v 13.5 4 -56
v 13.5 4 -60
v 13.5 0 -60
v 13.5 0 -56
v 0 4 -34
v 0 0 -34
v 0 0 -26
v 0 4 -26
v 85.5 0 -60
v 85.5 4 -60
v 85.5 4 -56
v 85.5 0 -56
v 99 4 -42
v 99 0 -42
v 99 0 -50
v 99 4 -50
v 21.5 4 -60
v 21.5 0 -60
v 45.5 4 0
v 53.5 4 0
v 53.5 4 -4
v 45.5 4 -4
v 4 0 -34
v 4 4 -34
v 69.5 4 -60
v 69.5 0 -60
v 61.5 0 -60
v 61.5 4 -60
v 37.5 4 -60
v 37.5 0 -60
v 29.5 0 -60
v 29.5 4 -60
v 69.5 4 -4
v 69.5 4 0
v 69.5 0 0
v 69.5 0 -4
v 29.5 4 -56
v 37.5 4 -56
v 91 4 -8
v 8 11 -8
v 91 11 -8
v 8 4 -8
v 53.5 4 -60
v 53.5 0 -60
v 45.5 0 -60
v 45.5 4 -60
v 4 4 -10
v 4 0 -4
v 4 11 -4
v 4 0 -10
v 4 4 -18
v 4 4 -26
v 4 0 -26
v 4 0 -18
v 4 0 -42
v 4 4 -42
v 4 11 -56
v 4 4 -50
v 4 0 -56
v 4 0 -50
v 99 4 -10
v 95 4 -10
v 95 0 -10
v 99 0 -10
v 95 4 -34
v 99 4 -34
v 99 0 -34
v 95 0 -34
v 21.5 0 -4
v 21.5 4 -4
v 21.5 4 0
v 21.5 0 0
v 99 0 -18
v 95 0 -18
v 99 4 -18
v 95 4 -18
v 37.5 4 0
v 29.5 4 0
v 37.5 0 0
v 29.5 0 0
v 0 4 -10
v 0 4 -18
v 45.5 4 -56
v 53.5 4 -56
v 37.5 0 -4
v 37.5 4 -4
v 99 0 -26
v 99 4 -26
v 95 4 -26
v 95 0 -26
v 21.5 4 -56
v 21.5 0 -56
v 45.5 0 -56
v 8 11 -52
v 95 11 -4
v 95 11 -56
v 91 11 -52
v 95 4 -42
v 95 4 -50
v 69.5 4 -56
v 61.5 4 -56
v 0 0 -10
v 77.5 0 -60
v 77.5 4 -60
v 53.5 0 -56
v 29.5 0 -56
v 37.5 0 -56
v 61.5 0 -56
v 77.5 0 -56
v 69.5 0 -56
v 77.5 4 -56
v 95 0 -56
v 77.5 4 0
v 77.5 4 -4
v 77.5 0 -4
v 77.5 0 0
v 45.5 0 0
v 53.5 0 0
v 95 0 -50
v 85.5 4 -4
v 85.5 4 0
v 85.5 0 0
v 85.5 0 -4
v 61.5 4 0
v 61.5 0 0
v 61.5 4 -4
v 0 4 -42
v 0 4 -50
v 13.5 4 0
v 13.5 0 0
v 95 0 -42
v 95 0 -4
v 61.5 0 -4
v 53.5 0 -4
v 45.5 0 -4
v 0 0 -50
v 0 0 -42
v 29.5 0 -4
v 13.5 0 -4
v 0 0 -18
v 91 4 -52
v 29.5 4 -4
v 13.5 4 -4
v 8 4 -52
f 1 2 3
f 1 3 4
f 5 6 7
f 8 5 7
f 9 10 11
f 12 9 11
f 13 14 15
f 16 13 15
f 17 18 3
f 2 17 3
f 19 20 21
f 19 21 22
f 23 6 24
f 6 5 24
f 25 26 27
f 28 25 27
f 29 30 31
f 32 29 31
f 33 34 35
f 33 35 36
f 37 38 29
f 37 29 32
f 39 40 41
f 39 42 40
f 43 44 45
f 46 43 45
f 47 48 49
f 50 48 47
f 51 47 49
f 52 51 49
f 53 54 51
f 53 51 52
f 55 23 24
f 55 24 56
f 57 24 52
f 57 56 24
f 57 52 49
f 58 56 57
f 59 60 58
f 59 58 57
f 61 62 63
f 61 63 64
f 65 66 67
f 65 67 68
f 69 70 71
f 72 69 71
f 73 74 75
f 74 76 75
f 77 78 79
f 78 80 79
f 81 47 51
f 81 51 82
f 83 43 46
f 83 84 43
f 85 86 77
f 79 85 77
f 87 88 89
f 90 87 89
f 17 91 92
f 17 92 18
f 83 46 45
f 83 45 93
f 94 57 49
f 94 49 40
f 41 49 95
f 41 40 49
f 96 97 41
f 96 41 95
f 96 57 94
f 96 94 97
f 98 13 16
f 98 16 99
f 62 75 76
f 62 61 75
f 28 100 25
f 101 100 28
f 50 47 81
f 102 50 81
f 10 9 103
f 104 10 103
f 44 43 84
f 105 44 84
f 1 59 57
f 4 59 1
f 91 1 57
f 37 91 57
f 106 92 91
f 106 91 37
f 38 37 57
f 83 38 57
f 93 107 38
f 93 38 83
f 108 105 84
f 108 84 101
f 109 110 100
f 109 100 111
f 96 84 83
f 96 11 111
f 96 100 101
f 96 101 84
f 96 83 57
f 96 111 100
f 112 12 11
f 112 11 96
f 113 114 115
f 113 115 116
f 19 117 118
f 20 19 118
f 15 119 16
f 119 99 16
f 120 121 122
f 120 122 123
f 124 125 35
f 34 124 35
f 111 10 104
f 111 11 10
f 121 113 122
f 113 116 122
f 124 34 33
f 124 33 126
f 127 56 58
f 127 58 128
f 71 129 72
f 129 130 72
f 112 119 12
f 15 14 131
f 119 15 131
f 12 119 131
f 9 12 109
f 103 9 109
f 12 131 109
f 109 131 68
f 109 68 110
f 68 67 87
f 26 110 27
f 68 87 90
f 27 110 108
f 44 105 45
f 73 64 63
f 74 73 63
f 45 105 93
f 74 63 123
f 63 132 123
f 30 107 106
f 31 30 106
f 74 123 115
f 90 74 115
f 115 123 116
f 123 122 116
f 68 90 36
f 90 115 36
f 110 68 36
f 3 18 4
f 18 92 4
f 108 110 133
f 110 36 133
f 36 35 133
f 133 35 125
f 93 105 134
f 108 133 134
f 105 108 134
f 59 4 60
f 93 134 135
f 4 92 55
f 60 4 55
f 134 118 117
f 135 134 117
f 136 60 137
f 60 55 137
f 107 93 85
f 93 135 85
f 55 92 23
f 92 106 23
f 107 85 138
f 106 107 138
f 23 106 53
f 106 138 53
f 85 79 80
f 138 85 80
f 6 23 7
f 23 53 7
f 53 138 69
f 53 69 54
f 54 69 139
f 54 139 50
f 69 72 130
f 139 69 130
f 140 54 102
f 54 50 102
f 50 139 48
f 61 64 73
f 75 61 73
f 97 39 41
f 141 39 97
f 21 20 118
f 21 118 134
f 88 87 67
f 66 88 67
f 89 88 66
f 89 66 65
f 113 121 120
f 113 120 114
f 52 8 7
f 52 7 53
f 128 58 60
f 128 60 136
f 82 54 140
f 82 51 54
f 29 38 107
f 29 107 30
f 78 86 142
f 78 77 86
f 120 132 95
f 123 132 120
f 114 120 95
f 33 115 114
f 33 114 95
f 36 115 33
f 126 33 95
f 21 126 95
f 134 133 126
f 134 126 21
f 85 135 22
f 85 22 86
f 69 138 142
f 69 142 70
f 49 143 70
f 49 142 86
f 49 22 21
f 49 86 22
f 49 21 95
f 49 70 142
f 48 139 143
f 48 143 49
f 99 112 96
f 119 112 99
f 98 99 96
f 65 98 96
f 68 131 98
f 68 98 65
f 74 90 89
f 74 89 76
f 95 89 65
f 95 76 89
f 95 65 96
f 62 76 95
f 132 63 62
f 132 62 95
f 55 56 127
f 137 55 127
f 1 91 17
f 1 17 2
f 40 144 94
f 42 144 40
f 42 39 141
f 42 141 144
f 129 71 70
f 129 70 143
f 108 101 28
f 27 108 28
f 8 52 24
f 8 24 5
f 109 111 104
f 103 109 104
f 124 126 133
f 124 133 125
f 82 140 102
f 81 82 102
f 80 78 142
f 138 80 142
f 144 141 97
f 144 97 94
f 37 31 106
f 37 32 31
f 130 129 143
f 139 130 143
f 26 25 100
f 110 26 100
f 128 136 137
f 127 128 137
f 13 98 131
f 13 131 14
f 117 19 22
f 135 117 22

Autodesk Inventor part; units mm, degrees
ref_plane "YZ Plane" through (0, 0, 0) normal (1, 0, 0) x (0, 1, 0)
ref_plane "XZ Plane" through (0, 0, 0) normal (0, 1, 0) x (-1, 0, 0)
ref_plane "XY Plane" through (0, 0, 0) normal (0, 0, 1) x (1, 0, 0)
sketch "Sketch1" plane through (0, 0, 0) normal (0, 1, 0) x (-1, 0, 0)
  line L0 (0, 0) -> (-99, 0)
  line L1 (-99, 0) -> (-99, -60)
  line L2 (-99, -60) -> (0, -60)
  line L3 (0, -60) -> (0, 0)
  dimension "d0" = 99
  dimension "d1" = 60
extrude "Extrusion1" add sketch "Sketch1" along normal blind 4
sketch "Sketch3" plane through (0, 4, 0) normal (0, 1, 0) x (1, 0, 0)
  line L0 (99, 60) -> (0, 60) construction
  line L1 (0, 60) -> (0, 0) construction
  line L2 (0, 0) -> (99, 0) construction
  line L3 (99, 0) -> (99, 60) construction
  line L4 (4, 56) -> (95, 56) construction
  line L5 (95, 56) -> (95, 4) construction
  line L6 (95, 4) -> (4, 4) construction
  line L7 (4, 4) -> (4, 56) construction
  line L8 (0, 30) -> (99, 30) construction
  line L9 (49.5, 0) -> (49.5, 60) construction
  line L10 (0, 50) -> (0, 60)
  line L11 (0, 60) -> (13.5, 60)
  line L12 (13.5, 60) -> (13.5, 56)
  line L13 (13.5, 56) -> (4, 56)
  line L14 (4, 56) -> (4, 50)
  line L15 (4, 50) -> (0, 50)
  line L16 (0, 34) -> (4, 34)
  line L17 (4, 34) -> (4, 42)
  line L18 (4, 42) -> (0, 42)
  line L19 (0, 42) -> (0, 34)
  line L20 (45.5, 56) -> (37.5, 56)
  line L21 (37.5, 56) -> (37.5, 60)
  line L22 (37.5, 60) -> (45.5, 60)
  line L23 (45.5, 60) -> (45.5, 56)
  line L24 (29.5, 56) -> (21.5, 56)
  line L25 (21.5, 56) -> (21.5, 60)
  line L26 (21.5, 60) -> (29.5, 60)
  line L27 (29.5, 60) -> (29.5, 56)
  line L28 (0, 10) -> (0, 0)
  line L29 (0, 0) -> (13.5, 0)
  line L30 (13.5, 0) -> (13.5, 4)
  line L31 (13.5, 4) -> (4, 4)
  line L32 (4, 4) -> (4, 10)
  line L33 (4, 10) -> (0, 10)
  line L34 (0, 26) -> (4, 26)
  line L35 (4, 26) -> (4, 18)
  line L36 (4, 18) -> (0, 18)
  line L37 (0, 18) -> (0, 26)
  line L38 (45.5, 4) -> (37.5, 4)
  line L39 (37.5, 4) -> (37.5, 0)
  line L40 (37.5, 0) -> (45.5, 0)
  line L41 (45.5, 0) -> (45.5, 4)
  line L42 (29.5, 4) -> (21.5, 4)
  line L43 (21.5, 4) -> (21.5, 0)
  line L44 (21.5, 0) -> (29.5, 0)
  line L45 (29.5, 0) -> (29.5, 4)
  line L46 (99, 60) -> (99, 0) construction
  line L47 (95, 4) -> (95, 56) construction
  line L48 (99, 50) -> (99, 60)
  line L49 (99, 60) -> (85.5, 60)
  line L50 (85.5, 60) -> (85.5, 56)
  line L51 (85.5, 56) -> (95, 56)
  line L52 (95, 56) -> (95, 50)
  line L53 (95, 50) -> (99, 50)
  line L54 (99, 34) -> (95, 34)
  line L55 (95, 34) -> (95, 42)
  line L56 (95, 42) -> (99, 42)
  line L57 (99, 42) -> (99, 34)
  line L58 (53.5, 56) -> (61.5, 56)
  line L59 (61.5, 56) -> (61.5, 60)
  line L60 (61.5, 60) -> (53.5, 60)
  line L61 (53.5, 60) -> (53.5, 56)
  line L62 (69.5, 56) -> (77.5, 56)
  line L63 (77.5, 56) -> (77.5, 60)
  line L64 (77.5, 60) -> (69.5, 60)
  line L65 (69.5, 60) -> (69.5, 56)
  line L66 (77.5, 4) -> (77.5, 0)
  line L67 (69.5, 4) -> (77.5, 4)
  line L68 (77.5, 0) -> (69.5, 0)
  line L69 (69.5, 0) -> (69.5, 4)
  line L70 (61.5, 4) -> (61.5, 0)
  line L71 (53.5, 0) -> (53.5, 4)
  line L72 (53.5, 4) -> (61.5, 4)
  line L73 (61.5, 0) -> (53.5, 0)
  line L74 (85.5, 0) -> (85.5, 4)
  line L75 (85.5, 4) -> (95, 4)
  line L76 (95, 4) -> (95, 10)
  line L77 (99, 0) -> (85.5, 0)
  line L78 (99, 10) -> (99, 0)
  line L79 (95, 10) -> (99, 10)
  line L80 (95, 18) -> (99, 18)
  line L81 (95, 26) -> (95, 18)
  line L82 (99, 18) -> (99, 26)
  line L83 (99, 26) -> (95, 26)
  dimension "d11" = 4
  dimension "d12" = 8
  dimension "d13" = 4
  dimension "d14" = 8
  dimension "d15" = 8
  dimension "d16" = 4
  dimension "d17" = 8
  dimension "d18" = 8
  dimension "d19" = 8
extrude "Extrusion3" cut sketch "Sketch3" against normal up to surface (4 mm away)
sketch "Sketch5" plane through (0, 4, 0) normal (0, 1, 0) x (1, 0, 0)
  line L0 (77.5, 0) -> (85.5, 0) projected
  line L1 (99, 42) -> (99, 50) projected
  line L2 (21.5, 60) -> (13.5, 60) projected
  line L3 (0, 18) -> (0, 10) projected
  line L4 (4, 56) -> (95, 56)
  line L5 (95, 56) -> (95, 4)
  line L6 (95, 4) -> (4, 4)
  line L7 (4, 4) -> (4, 56)
  line L8 (91, 52) -> (8, 52)
  line L9 (8, 52) -> (8, 8)
  line L10 (8, 8) -> (91, 8)
  line L11 (91, 8) -> (91, 52)
  line L12 (13.5, 60) -> (13.5, 56) projected
  line L13 (13.5, 56) -> (4, 56) projected
  line L14 (4, 56) -> (4, 50) projected
  line L15 (4, 50) -> (0, 50) projected
  line L16 (0, 50) -> (0, 42) projected
  line L17 (0, 42) -> (4, 42) projected
  line L18 (4, 42) -> (4, 34) projected
  line L19 (4, 34) -> (0, 34) projected
  line L20 (0, 34) -> (0, 26) projected
  line L21 (0, 26) -> (4, 26) projected
  line L22 (4, 26) -> (4, 18) projected
  line L23 (4, 18) -> (0, 18) projected
  line L24 (0, 10) -> (4, 10) projected
  line L25 (4, 10) -> (4, 4) projected
  line L26 (4, 4) -> (13.5, 4) projected
  line L27 (13.5, 4) -> (13.5, 0) projected
  line L28 (13.5, 0) -> (21.5, 0) projected
  line L29 (21.5, 0) -> (21.5, 4) projected
  line L30 (21.5, 4) -> (29.5, 4) projected
  line L31 (29.5, 4) -> (29.5, 0) projected
  line L32 (29.5, 0) -> (37.5, 0) projected
  line L33 (37.5, 0) -> (37.5, 4) projected
  line L34 (37.5, 4) -> (45.5, 4) projected
  line L35 (45.5, 4) -> (45.5, 0) projected
  line L36 (45.5, 0) -> (53.5, 0) projected
  line L37 (53.5, 0) -> (53.5, 4) projected
  line L38 (53.5, 4) -> (61.5, 4) projected
  line L39 (61.5, 4) -> (61.5, 0) projected
  line L40 (61.5, 0) -> (69.5, 0) projected
  line L41 (69.5, 0) -> (69.5, 4) projected
  line L42 (69.5, 4) -> (77.5, 4) projected
  line L43 (77.5, 4) -> (77.5, 0) projected
  line L44 (85.5, 0) -> (85.5, 4) projected
  line L45 (85.5, 4) -> (95, 4) projected
  line L46 (95, 4) -> (95, 10) projected
  line L47 (95, 10) -> (99, 10) projected
  line L48 (99, 10) -> (99, 18) projected
  line L49 (99, 18) -> (95, 18) projected
  line L50 (95, 18) -> (95, 26) projected
  line L51 (95, 26) -> (99, 26) projected
  line L52 (99, 26) -> (99, 34) projected
  line L53 (99, 34) -> (95, 34) projected
  line L54 (95, 34) -> (95, 42) projected
  line L55 (95, 42) -> (99, 42) projected
  line L56 (99, 50) -> (95, 50) projected
  line L57 (95, 50) -> (95, 56) projected
  line L58 (95, 56) -> (85.5, 56) projected
  line L59 (85.5, 56) -> (85.5, 60) projected
  line L60 (85.5, 60) -> (77.5, 60) projected
  line L61 (77.5, 60) -> (77.5, 56) projected
  line L62 (77.5, 56) -> (69.5, 56) projected
  line L63 (69.5, 56) -> (69.5, 60) projected
  line L64 (69.5, 60) -> (61.5, 60) projected
  line L65 (61.5, 60) -> (61.5, 56) projected
  line L66 (61.5, 56) -> (53.5, 56) projected
  line L67 (53.5, 56) -> (53.5, 60) projected
  line L68 (53.5, 60) -> (45.5, 60) projected
  line L69 (45.5, 60) -> (45.5, 56) projected
  line L70 (45.5, 56) -> (37.5, 56) projected
  line L71 (37.5, 56) -> (37.5, 60) projected
  line L72 (37.5, 60) -> (29.5, 60) projected
  line L73 (29.5, 60) -> (29.5, 56) projected
  line L74 (29.5, 56) -> (21.5, 56) projected
  line L75 (21.5, 56) -> (21.5, 60) projected
  point P0 (0, 0)
  dimension "d22" = 4
  dimension "d23" = 4
extrude "Extrusion4" add sketch "Sketch5" along normal blind 7 contours L6 L7 L4 L5
properties part number "top" material "PBT Plastic Black"
